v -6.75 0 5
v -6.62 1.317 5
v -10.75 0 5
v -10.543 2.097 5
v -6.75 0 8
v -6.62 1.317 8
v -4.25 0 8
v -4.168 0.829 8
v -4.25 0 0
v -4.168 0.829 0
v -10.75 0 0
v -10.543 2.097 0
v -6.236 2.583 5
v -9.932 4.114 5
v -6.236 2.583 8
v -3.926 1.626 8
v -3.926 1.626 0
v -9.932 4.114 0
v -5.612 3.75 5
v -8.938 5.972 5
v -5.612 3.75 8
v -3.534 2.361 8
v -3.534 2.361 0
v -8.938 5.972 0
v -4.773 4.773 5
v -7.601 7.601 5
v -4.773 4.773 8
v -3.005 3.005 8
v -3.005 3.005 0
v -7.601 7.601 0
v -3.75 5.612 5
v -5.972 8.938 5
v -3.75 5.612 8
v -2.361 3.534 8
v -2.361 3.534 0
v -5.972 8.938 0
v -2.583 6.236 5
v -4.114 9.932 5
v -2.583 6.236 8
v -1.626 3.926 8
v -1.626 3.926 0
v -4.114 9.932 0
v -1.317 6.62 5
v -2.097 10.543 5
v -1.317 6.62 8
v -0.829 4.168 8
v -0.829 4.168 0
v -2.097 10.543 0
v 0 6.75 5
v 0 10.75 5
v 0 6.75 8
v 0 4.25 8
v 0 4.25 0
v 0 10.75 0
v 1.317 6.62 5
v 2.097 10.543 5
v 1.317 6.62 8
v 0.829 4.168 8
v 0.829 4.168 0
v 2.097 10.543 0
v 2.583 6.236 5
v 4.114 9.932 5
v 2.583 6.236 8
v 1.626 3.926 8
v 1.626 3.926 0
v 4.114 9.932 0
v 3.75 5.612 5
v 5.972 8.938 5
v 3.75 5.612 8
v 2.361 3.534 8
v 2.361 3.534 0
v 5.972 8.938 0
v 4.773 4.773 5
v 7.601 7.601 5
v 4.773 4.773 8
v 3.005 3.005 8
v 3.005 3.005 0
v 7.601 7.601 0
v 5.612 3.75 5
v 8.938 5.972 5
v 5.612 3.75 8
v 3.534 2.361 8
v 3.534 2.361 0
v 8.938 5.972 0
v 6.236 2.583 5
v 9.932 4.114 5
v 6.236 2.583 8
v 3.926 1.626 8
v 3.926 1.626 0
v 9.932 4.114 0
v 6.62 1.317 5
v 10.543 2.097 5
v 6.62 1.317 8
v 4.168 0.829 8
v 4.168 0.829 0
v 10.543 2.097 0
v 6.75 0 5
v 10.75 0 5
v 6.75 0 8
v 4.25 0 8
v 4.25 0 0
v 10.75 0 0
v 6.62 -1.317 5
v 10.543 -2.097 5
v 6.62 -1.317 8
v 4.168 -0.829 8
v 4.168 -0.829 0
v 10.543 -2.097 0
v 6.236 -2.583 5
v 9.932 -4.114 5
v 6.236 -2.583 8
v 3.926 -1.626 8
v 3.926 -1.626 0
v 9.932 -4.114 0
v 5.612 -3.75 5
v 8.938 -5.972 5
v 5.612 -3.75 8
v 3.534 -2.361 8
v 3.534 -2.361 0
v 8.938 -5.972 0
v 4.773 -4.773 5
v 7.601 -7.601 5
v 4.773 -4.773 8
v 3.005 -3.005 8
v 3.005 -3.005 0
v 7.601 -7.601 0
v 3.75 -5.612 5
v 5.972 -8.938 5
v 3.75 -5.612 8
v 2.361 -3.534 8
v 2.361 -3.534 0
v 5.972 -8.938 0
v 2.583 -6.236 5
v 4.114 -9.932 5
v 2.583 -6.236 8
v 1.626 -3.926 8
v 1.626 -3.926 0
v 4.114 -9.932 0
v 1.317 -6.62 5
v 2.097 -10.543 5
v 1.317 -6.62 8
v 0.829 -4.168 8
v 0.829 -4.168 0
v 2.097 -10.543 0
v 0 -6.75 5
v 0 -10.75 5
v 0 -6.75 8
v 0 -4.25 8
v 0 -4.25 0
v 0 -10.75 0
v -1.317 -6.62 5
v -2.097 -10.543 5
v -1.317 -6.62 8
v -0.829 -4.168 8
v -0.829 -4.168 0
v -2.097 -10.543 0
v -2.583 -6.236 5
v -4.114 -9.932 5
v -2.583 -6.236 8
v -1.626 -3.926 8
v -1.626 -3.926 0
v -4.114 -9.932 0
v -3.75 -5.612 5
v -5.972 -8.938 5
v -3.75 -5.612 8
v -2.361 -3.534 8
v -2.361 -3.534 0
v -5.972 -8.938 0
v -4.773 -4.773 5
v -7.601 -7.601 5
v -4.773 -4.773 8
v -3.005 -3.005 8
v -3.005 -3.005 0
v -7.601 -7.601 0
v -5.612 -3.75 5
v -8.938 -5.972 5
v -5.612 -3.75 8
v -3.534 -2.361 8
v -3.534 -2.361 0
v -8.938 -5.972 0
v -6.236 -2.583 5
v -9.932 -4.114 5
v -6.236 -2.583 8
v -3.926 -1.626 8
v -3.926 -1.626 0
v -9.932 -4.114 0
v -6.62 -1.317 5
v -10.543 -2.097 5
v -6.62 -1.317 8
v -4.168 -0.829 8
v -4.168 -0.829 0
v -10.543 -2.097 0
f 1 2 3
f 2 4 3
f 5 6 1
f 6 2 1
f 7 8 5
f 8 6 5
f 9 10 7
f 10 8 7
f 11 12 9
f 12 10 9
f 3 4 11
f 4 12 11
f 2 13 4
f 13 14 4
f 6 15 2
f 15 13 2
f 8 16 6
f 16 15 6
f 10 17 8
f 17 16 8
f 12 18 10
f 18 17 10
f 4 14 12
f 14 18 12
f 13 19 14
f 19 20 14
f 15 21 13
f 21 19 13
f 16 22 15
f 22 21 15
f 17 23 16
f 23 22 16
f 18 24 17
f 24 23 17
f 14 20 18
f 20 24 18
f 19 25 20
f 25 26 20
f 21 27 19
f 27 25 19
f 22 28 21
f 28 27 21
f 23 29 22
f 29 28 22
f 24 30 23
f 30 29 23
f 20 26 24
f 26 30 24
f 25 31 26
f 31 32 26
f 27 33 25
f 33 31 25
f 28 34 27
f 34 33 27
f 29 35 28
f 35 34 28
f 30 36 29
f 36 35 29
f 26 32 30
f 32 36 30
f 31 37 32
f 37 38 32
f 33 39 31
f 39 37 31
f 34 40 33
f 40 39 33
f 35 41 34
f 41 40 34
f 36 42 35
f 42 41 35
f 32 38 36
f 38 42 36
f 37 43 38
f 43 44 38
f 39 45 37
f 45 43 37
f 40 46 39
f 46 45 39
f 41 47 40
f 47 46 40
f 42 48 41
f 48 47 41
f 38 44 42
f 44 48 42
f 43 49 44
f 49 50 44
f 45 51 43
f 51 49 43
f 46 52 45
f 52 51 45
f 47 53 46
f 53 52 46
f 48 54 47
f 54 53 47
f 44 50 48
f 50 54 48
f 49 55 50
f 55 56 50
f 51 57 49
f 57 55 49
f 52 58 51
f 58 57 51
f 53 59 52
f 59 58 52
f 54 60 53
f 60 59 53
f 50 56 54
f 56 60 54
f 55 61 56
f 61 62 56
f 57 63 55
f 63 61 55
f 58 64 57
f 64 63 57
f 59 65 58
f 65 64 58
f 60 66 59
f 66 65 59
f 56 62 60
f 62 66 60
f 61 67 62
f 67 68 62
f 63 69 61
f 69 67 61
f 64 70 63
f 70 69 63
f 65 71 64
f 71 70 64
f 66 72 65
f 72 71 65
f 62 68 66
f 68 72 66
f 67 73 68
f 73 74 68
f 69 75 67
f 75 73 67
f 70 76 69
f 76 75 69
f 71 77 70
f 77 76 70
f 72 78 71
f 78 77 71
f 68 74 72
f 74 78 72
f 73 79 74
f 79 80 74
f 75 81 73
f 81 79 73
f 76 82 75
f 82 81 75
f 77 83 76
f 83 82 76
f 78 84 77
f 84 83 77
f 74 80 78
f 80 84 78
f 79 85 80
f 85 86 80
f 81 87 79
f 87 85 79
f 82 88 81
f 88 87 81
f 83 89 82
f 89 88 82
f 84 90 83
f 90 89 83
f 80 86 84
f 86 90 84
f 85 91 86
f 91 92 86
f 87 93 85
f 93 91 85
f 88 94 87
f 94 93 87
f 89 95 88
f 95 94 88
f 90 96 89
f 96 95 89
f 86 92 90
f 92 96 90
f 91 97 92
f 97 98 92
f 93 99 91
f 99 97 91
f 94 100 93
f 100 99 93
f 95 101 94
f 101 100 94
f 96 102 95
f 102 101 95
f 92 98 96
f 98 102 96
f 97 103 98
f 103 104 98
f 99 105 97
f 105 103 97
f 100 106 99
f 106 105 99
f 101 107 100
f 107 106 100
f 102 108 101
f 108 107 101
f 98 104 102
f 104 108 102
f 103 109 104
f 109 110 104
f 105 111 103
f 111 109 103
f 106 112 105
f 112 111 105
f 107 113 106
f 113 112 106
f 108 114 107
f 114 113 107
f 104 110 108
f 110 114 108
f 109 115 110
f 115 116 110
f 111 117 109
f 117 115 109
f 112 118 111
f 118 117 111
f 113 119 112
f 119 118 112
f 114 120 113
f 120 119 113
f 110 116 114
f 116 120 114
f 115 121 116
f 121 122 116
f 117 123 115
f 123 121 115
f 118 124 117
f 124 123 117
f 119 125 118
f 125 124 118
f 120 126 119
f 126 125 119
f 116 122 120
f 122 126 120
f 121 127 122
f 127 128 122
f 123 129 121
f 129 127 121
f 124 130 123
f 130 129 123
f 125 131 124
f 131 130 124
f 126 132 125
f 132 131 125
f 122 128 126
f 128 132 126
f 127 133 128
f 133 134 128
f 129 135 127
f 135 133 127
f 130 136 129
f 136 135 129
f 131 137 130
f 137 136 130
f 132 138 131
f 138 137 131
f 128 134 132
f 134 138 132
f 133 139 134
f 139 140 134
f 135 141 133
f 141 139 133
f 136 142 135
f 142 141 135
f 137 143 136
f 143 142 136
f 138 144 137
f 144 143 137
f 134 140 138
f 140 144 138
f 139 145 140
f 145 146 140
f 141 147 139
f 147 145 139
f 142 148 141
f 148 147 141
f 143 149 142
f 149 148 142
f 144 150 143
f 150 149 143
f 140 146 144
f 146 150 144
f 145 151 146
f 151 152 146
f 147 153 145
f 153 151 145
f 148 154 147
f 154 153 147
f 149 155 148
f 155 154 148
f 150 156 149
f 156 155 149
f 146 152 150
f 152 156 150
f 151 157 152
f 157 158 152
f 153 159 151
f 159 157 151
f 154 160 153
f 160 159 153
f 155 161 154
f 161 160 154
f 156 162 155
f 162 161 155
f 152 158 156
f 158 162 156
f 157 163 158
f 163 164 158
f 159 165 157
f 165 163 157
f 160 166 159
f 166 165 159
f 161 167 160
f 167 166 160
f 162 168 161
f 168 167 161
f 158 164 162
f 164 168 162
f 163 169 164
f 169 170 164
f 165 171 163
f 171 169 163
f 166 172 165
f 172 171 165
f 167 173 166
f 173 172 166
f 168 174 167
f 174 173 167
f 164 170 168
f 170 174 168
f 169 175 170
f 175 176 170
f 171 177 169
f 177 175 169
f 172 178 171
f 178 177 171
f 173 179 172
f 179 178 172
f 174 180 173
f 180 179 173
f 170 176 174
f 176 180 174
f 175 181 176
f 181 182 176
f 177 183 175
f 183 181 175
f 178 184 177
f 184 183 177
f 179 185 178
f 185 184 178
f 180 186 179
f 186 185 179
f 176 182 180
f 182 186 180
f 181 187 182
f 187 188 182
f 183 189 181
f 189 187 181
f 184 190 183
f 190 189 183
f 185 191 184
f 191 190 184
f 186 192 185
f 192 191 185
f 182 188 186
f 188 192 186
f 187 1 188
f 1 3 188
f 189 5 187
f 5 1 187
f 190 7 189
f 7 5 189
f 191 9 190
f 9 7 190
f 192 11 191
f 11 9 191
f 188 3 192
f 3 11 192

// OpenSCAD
$fn = 32;

// ----------------------------------------------------------------------
// Form washer: stepped_c washer, 21.5 mm outside, 8.5 mm bore
// ----------------------------------------------------------------------

// --- parameters (mm) ---
revolve_angle = 360;      // full turn around the Z axis
profile_points = 6;       // points of the closed outline

profile = [[4.25, 0], [10.75, 0], [10.75, 5], [6.75, 5], [6.75, 8], [4.25, 8]];  // single closed polygon, 6 points, counter clockwise

// --- the one profile operation ---
rotate_extrude(angle = revolve_angle) polygon(points = profile);
